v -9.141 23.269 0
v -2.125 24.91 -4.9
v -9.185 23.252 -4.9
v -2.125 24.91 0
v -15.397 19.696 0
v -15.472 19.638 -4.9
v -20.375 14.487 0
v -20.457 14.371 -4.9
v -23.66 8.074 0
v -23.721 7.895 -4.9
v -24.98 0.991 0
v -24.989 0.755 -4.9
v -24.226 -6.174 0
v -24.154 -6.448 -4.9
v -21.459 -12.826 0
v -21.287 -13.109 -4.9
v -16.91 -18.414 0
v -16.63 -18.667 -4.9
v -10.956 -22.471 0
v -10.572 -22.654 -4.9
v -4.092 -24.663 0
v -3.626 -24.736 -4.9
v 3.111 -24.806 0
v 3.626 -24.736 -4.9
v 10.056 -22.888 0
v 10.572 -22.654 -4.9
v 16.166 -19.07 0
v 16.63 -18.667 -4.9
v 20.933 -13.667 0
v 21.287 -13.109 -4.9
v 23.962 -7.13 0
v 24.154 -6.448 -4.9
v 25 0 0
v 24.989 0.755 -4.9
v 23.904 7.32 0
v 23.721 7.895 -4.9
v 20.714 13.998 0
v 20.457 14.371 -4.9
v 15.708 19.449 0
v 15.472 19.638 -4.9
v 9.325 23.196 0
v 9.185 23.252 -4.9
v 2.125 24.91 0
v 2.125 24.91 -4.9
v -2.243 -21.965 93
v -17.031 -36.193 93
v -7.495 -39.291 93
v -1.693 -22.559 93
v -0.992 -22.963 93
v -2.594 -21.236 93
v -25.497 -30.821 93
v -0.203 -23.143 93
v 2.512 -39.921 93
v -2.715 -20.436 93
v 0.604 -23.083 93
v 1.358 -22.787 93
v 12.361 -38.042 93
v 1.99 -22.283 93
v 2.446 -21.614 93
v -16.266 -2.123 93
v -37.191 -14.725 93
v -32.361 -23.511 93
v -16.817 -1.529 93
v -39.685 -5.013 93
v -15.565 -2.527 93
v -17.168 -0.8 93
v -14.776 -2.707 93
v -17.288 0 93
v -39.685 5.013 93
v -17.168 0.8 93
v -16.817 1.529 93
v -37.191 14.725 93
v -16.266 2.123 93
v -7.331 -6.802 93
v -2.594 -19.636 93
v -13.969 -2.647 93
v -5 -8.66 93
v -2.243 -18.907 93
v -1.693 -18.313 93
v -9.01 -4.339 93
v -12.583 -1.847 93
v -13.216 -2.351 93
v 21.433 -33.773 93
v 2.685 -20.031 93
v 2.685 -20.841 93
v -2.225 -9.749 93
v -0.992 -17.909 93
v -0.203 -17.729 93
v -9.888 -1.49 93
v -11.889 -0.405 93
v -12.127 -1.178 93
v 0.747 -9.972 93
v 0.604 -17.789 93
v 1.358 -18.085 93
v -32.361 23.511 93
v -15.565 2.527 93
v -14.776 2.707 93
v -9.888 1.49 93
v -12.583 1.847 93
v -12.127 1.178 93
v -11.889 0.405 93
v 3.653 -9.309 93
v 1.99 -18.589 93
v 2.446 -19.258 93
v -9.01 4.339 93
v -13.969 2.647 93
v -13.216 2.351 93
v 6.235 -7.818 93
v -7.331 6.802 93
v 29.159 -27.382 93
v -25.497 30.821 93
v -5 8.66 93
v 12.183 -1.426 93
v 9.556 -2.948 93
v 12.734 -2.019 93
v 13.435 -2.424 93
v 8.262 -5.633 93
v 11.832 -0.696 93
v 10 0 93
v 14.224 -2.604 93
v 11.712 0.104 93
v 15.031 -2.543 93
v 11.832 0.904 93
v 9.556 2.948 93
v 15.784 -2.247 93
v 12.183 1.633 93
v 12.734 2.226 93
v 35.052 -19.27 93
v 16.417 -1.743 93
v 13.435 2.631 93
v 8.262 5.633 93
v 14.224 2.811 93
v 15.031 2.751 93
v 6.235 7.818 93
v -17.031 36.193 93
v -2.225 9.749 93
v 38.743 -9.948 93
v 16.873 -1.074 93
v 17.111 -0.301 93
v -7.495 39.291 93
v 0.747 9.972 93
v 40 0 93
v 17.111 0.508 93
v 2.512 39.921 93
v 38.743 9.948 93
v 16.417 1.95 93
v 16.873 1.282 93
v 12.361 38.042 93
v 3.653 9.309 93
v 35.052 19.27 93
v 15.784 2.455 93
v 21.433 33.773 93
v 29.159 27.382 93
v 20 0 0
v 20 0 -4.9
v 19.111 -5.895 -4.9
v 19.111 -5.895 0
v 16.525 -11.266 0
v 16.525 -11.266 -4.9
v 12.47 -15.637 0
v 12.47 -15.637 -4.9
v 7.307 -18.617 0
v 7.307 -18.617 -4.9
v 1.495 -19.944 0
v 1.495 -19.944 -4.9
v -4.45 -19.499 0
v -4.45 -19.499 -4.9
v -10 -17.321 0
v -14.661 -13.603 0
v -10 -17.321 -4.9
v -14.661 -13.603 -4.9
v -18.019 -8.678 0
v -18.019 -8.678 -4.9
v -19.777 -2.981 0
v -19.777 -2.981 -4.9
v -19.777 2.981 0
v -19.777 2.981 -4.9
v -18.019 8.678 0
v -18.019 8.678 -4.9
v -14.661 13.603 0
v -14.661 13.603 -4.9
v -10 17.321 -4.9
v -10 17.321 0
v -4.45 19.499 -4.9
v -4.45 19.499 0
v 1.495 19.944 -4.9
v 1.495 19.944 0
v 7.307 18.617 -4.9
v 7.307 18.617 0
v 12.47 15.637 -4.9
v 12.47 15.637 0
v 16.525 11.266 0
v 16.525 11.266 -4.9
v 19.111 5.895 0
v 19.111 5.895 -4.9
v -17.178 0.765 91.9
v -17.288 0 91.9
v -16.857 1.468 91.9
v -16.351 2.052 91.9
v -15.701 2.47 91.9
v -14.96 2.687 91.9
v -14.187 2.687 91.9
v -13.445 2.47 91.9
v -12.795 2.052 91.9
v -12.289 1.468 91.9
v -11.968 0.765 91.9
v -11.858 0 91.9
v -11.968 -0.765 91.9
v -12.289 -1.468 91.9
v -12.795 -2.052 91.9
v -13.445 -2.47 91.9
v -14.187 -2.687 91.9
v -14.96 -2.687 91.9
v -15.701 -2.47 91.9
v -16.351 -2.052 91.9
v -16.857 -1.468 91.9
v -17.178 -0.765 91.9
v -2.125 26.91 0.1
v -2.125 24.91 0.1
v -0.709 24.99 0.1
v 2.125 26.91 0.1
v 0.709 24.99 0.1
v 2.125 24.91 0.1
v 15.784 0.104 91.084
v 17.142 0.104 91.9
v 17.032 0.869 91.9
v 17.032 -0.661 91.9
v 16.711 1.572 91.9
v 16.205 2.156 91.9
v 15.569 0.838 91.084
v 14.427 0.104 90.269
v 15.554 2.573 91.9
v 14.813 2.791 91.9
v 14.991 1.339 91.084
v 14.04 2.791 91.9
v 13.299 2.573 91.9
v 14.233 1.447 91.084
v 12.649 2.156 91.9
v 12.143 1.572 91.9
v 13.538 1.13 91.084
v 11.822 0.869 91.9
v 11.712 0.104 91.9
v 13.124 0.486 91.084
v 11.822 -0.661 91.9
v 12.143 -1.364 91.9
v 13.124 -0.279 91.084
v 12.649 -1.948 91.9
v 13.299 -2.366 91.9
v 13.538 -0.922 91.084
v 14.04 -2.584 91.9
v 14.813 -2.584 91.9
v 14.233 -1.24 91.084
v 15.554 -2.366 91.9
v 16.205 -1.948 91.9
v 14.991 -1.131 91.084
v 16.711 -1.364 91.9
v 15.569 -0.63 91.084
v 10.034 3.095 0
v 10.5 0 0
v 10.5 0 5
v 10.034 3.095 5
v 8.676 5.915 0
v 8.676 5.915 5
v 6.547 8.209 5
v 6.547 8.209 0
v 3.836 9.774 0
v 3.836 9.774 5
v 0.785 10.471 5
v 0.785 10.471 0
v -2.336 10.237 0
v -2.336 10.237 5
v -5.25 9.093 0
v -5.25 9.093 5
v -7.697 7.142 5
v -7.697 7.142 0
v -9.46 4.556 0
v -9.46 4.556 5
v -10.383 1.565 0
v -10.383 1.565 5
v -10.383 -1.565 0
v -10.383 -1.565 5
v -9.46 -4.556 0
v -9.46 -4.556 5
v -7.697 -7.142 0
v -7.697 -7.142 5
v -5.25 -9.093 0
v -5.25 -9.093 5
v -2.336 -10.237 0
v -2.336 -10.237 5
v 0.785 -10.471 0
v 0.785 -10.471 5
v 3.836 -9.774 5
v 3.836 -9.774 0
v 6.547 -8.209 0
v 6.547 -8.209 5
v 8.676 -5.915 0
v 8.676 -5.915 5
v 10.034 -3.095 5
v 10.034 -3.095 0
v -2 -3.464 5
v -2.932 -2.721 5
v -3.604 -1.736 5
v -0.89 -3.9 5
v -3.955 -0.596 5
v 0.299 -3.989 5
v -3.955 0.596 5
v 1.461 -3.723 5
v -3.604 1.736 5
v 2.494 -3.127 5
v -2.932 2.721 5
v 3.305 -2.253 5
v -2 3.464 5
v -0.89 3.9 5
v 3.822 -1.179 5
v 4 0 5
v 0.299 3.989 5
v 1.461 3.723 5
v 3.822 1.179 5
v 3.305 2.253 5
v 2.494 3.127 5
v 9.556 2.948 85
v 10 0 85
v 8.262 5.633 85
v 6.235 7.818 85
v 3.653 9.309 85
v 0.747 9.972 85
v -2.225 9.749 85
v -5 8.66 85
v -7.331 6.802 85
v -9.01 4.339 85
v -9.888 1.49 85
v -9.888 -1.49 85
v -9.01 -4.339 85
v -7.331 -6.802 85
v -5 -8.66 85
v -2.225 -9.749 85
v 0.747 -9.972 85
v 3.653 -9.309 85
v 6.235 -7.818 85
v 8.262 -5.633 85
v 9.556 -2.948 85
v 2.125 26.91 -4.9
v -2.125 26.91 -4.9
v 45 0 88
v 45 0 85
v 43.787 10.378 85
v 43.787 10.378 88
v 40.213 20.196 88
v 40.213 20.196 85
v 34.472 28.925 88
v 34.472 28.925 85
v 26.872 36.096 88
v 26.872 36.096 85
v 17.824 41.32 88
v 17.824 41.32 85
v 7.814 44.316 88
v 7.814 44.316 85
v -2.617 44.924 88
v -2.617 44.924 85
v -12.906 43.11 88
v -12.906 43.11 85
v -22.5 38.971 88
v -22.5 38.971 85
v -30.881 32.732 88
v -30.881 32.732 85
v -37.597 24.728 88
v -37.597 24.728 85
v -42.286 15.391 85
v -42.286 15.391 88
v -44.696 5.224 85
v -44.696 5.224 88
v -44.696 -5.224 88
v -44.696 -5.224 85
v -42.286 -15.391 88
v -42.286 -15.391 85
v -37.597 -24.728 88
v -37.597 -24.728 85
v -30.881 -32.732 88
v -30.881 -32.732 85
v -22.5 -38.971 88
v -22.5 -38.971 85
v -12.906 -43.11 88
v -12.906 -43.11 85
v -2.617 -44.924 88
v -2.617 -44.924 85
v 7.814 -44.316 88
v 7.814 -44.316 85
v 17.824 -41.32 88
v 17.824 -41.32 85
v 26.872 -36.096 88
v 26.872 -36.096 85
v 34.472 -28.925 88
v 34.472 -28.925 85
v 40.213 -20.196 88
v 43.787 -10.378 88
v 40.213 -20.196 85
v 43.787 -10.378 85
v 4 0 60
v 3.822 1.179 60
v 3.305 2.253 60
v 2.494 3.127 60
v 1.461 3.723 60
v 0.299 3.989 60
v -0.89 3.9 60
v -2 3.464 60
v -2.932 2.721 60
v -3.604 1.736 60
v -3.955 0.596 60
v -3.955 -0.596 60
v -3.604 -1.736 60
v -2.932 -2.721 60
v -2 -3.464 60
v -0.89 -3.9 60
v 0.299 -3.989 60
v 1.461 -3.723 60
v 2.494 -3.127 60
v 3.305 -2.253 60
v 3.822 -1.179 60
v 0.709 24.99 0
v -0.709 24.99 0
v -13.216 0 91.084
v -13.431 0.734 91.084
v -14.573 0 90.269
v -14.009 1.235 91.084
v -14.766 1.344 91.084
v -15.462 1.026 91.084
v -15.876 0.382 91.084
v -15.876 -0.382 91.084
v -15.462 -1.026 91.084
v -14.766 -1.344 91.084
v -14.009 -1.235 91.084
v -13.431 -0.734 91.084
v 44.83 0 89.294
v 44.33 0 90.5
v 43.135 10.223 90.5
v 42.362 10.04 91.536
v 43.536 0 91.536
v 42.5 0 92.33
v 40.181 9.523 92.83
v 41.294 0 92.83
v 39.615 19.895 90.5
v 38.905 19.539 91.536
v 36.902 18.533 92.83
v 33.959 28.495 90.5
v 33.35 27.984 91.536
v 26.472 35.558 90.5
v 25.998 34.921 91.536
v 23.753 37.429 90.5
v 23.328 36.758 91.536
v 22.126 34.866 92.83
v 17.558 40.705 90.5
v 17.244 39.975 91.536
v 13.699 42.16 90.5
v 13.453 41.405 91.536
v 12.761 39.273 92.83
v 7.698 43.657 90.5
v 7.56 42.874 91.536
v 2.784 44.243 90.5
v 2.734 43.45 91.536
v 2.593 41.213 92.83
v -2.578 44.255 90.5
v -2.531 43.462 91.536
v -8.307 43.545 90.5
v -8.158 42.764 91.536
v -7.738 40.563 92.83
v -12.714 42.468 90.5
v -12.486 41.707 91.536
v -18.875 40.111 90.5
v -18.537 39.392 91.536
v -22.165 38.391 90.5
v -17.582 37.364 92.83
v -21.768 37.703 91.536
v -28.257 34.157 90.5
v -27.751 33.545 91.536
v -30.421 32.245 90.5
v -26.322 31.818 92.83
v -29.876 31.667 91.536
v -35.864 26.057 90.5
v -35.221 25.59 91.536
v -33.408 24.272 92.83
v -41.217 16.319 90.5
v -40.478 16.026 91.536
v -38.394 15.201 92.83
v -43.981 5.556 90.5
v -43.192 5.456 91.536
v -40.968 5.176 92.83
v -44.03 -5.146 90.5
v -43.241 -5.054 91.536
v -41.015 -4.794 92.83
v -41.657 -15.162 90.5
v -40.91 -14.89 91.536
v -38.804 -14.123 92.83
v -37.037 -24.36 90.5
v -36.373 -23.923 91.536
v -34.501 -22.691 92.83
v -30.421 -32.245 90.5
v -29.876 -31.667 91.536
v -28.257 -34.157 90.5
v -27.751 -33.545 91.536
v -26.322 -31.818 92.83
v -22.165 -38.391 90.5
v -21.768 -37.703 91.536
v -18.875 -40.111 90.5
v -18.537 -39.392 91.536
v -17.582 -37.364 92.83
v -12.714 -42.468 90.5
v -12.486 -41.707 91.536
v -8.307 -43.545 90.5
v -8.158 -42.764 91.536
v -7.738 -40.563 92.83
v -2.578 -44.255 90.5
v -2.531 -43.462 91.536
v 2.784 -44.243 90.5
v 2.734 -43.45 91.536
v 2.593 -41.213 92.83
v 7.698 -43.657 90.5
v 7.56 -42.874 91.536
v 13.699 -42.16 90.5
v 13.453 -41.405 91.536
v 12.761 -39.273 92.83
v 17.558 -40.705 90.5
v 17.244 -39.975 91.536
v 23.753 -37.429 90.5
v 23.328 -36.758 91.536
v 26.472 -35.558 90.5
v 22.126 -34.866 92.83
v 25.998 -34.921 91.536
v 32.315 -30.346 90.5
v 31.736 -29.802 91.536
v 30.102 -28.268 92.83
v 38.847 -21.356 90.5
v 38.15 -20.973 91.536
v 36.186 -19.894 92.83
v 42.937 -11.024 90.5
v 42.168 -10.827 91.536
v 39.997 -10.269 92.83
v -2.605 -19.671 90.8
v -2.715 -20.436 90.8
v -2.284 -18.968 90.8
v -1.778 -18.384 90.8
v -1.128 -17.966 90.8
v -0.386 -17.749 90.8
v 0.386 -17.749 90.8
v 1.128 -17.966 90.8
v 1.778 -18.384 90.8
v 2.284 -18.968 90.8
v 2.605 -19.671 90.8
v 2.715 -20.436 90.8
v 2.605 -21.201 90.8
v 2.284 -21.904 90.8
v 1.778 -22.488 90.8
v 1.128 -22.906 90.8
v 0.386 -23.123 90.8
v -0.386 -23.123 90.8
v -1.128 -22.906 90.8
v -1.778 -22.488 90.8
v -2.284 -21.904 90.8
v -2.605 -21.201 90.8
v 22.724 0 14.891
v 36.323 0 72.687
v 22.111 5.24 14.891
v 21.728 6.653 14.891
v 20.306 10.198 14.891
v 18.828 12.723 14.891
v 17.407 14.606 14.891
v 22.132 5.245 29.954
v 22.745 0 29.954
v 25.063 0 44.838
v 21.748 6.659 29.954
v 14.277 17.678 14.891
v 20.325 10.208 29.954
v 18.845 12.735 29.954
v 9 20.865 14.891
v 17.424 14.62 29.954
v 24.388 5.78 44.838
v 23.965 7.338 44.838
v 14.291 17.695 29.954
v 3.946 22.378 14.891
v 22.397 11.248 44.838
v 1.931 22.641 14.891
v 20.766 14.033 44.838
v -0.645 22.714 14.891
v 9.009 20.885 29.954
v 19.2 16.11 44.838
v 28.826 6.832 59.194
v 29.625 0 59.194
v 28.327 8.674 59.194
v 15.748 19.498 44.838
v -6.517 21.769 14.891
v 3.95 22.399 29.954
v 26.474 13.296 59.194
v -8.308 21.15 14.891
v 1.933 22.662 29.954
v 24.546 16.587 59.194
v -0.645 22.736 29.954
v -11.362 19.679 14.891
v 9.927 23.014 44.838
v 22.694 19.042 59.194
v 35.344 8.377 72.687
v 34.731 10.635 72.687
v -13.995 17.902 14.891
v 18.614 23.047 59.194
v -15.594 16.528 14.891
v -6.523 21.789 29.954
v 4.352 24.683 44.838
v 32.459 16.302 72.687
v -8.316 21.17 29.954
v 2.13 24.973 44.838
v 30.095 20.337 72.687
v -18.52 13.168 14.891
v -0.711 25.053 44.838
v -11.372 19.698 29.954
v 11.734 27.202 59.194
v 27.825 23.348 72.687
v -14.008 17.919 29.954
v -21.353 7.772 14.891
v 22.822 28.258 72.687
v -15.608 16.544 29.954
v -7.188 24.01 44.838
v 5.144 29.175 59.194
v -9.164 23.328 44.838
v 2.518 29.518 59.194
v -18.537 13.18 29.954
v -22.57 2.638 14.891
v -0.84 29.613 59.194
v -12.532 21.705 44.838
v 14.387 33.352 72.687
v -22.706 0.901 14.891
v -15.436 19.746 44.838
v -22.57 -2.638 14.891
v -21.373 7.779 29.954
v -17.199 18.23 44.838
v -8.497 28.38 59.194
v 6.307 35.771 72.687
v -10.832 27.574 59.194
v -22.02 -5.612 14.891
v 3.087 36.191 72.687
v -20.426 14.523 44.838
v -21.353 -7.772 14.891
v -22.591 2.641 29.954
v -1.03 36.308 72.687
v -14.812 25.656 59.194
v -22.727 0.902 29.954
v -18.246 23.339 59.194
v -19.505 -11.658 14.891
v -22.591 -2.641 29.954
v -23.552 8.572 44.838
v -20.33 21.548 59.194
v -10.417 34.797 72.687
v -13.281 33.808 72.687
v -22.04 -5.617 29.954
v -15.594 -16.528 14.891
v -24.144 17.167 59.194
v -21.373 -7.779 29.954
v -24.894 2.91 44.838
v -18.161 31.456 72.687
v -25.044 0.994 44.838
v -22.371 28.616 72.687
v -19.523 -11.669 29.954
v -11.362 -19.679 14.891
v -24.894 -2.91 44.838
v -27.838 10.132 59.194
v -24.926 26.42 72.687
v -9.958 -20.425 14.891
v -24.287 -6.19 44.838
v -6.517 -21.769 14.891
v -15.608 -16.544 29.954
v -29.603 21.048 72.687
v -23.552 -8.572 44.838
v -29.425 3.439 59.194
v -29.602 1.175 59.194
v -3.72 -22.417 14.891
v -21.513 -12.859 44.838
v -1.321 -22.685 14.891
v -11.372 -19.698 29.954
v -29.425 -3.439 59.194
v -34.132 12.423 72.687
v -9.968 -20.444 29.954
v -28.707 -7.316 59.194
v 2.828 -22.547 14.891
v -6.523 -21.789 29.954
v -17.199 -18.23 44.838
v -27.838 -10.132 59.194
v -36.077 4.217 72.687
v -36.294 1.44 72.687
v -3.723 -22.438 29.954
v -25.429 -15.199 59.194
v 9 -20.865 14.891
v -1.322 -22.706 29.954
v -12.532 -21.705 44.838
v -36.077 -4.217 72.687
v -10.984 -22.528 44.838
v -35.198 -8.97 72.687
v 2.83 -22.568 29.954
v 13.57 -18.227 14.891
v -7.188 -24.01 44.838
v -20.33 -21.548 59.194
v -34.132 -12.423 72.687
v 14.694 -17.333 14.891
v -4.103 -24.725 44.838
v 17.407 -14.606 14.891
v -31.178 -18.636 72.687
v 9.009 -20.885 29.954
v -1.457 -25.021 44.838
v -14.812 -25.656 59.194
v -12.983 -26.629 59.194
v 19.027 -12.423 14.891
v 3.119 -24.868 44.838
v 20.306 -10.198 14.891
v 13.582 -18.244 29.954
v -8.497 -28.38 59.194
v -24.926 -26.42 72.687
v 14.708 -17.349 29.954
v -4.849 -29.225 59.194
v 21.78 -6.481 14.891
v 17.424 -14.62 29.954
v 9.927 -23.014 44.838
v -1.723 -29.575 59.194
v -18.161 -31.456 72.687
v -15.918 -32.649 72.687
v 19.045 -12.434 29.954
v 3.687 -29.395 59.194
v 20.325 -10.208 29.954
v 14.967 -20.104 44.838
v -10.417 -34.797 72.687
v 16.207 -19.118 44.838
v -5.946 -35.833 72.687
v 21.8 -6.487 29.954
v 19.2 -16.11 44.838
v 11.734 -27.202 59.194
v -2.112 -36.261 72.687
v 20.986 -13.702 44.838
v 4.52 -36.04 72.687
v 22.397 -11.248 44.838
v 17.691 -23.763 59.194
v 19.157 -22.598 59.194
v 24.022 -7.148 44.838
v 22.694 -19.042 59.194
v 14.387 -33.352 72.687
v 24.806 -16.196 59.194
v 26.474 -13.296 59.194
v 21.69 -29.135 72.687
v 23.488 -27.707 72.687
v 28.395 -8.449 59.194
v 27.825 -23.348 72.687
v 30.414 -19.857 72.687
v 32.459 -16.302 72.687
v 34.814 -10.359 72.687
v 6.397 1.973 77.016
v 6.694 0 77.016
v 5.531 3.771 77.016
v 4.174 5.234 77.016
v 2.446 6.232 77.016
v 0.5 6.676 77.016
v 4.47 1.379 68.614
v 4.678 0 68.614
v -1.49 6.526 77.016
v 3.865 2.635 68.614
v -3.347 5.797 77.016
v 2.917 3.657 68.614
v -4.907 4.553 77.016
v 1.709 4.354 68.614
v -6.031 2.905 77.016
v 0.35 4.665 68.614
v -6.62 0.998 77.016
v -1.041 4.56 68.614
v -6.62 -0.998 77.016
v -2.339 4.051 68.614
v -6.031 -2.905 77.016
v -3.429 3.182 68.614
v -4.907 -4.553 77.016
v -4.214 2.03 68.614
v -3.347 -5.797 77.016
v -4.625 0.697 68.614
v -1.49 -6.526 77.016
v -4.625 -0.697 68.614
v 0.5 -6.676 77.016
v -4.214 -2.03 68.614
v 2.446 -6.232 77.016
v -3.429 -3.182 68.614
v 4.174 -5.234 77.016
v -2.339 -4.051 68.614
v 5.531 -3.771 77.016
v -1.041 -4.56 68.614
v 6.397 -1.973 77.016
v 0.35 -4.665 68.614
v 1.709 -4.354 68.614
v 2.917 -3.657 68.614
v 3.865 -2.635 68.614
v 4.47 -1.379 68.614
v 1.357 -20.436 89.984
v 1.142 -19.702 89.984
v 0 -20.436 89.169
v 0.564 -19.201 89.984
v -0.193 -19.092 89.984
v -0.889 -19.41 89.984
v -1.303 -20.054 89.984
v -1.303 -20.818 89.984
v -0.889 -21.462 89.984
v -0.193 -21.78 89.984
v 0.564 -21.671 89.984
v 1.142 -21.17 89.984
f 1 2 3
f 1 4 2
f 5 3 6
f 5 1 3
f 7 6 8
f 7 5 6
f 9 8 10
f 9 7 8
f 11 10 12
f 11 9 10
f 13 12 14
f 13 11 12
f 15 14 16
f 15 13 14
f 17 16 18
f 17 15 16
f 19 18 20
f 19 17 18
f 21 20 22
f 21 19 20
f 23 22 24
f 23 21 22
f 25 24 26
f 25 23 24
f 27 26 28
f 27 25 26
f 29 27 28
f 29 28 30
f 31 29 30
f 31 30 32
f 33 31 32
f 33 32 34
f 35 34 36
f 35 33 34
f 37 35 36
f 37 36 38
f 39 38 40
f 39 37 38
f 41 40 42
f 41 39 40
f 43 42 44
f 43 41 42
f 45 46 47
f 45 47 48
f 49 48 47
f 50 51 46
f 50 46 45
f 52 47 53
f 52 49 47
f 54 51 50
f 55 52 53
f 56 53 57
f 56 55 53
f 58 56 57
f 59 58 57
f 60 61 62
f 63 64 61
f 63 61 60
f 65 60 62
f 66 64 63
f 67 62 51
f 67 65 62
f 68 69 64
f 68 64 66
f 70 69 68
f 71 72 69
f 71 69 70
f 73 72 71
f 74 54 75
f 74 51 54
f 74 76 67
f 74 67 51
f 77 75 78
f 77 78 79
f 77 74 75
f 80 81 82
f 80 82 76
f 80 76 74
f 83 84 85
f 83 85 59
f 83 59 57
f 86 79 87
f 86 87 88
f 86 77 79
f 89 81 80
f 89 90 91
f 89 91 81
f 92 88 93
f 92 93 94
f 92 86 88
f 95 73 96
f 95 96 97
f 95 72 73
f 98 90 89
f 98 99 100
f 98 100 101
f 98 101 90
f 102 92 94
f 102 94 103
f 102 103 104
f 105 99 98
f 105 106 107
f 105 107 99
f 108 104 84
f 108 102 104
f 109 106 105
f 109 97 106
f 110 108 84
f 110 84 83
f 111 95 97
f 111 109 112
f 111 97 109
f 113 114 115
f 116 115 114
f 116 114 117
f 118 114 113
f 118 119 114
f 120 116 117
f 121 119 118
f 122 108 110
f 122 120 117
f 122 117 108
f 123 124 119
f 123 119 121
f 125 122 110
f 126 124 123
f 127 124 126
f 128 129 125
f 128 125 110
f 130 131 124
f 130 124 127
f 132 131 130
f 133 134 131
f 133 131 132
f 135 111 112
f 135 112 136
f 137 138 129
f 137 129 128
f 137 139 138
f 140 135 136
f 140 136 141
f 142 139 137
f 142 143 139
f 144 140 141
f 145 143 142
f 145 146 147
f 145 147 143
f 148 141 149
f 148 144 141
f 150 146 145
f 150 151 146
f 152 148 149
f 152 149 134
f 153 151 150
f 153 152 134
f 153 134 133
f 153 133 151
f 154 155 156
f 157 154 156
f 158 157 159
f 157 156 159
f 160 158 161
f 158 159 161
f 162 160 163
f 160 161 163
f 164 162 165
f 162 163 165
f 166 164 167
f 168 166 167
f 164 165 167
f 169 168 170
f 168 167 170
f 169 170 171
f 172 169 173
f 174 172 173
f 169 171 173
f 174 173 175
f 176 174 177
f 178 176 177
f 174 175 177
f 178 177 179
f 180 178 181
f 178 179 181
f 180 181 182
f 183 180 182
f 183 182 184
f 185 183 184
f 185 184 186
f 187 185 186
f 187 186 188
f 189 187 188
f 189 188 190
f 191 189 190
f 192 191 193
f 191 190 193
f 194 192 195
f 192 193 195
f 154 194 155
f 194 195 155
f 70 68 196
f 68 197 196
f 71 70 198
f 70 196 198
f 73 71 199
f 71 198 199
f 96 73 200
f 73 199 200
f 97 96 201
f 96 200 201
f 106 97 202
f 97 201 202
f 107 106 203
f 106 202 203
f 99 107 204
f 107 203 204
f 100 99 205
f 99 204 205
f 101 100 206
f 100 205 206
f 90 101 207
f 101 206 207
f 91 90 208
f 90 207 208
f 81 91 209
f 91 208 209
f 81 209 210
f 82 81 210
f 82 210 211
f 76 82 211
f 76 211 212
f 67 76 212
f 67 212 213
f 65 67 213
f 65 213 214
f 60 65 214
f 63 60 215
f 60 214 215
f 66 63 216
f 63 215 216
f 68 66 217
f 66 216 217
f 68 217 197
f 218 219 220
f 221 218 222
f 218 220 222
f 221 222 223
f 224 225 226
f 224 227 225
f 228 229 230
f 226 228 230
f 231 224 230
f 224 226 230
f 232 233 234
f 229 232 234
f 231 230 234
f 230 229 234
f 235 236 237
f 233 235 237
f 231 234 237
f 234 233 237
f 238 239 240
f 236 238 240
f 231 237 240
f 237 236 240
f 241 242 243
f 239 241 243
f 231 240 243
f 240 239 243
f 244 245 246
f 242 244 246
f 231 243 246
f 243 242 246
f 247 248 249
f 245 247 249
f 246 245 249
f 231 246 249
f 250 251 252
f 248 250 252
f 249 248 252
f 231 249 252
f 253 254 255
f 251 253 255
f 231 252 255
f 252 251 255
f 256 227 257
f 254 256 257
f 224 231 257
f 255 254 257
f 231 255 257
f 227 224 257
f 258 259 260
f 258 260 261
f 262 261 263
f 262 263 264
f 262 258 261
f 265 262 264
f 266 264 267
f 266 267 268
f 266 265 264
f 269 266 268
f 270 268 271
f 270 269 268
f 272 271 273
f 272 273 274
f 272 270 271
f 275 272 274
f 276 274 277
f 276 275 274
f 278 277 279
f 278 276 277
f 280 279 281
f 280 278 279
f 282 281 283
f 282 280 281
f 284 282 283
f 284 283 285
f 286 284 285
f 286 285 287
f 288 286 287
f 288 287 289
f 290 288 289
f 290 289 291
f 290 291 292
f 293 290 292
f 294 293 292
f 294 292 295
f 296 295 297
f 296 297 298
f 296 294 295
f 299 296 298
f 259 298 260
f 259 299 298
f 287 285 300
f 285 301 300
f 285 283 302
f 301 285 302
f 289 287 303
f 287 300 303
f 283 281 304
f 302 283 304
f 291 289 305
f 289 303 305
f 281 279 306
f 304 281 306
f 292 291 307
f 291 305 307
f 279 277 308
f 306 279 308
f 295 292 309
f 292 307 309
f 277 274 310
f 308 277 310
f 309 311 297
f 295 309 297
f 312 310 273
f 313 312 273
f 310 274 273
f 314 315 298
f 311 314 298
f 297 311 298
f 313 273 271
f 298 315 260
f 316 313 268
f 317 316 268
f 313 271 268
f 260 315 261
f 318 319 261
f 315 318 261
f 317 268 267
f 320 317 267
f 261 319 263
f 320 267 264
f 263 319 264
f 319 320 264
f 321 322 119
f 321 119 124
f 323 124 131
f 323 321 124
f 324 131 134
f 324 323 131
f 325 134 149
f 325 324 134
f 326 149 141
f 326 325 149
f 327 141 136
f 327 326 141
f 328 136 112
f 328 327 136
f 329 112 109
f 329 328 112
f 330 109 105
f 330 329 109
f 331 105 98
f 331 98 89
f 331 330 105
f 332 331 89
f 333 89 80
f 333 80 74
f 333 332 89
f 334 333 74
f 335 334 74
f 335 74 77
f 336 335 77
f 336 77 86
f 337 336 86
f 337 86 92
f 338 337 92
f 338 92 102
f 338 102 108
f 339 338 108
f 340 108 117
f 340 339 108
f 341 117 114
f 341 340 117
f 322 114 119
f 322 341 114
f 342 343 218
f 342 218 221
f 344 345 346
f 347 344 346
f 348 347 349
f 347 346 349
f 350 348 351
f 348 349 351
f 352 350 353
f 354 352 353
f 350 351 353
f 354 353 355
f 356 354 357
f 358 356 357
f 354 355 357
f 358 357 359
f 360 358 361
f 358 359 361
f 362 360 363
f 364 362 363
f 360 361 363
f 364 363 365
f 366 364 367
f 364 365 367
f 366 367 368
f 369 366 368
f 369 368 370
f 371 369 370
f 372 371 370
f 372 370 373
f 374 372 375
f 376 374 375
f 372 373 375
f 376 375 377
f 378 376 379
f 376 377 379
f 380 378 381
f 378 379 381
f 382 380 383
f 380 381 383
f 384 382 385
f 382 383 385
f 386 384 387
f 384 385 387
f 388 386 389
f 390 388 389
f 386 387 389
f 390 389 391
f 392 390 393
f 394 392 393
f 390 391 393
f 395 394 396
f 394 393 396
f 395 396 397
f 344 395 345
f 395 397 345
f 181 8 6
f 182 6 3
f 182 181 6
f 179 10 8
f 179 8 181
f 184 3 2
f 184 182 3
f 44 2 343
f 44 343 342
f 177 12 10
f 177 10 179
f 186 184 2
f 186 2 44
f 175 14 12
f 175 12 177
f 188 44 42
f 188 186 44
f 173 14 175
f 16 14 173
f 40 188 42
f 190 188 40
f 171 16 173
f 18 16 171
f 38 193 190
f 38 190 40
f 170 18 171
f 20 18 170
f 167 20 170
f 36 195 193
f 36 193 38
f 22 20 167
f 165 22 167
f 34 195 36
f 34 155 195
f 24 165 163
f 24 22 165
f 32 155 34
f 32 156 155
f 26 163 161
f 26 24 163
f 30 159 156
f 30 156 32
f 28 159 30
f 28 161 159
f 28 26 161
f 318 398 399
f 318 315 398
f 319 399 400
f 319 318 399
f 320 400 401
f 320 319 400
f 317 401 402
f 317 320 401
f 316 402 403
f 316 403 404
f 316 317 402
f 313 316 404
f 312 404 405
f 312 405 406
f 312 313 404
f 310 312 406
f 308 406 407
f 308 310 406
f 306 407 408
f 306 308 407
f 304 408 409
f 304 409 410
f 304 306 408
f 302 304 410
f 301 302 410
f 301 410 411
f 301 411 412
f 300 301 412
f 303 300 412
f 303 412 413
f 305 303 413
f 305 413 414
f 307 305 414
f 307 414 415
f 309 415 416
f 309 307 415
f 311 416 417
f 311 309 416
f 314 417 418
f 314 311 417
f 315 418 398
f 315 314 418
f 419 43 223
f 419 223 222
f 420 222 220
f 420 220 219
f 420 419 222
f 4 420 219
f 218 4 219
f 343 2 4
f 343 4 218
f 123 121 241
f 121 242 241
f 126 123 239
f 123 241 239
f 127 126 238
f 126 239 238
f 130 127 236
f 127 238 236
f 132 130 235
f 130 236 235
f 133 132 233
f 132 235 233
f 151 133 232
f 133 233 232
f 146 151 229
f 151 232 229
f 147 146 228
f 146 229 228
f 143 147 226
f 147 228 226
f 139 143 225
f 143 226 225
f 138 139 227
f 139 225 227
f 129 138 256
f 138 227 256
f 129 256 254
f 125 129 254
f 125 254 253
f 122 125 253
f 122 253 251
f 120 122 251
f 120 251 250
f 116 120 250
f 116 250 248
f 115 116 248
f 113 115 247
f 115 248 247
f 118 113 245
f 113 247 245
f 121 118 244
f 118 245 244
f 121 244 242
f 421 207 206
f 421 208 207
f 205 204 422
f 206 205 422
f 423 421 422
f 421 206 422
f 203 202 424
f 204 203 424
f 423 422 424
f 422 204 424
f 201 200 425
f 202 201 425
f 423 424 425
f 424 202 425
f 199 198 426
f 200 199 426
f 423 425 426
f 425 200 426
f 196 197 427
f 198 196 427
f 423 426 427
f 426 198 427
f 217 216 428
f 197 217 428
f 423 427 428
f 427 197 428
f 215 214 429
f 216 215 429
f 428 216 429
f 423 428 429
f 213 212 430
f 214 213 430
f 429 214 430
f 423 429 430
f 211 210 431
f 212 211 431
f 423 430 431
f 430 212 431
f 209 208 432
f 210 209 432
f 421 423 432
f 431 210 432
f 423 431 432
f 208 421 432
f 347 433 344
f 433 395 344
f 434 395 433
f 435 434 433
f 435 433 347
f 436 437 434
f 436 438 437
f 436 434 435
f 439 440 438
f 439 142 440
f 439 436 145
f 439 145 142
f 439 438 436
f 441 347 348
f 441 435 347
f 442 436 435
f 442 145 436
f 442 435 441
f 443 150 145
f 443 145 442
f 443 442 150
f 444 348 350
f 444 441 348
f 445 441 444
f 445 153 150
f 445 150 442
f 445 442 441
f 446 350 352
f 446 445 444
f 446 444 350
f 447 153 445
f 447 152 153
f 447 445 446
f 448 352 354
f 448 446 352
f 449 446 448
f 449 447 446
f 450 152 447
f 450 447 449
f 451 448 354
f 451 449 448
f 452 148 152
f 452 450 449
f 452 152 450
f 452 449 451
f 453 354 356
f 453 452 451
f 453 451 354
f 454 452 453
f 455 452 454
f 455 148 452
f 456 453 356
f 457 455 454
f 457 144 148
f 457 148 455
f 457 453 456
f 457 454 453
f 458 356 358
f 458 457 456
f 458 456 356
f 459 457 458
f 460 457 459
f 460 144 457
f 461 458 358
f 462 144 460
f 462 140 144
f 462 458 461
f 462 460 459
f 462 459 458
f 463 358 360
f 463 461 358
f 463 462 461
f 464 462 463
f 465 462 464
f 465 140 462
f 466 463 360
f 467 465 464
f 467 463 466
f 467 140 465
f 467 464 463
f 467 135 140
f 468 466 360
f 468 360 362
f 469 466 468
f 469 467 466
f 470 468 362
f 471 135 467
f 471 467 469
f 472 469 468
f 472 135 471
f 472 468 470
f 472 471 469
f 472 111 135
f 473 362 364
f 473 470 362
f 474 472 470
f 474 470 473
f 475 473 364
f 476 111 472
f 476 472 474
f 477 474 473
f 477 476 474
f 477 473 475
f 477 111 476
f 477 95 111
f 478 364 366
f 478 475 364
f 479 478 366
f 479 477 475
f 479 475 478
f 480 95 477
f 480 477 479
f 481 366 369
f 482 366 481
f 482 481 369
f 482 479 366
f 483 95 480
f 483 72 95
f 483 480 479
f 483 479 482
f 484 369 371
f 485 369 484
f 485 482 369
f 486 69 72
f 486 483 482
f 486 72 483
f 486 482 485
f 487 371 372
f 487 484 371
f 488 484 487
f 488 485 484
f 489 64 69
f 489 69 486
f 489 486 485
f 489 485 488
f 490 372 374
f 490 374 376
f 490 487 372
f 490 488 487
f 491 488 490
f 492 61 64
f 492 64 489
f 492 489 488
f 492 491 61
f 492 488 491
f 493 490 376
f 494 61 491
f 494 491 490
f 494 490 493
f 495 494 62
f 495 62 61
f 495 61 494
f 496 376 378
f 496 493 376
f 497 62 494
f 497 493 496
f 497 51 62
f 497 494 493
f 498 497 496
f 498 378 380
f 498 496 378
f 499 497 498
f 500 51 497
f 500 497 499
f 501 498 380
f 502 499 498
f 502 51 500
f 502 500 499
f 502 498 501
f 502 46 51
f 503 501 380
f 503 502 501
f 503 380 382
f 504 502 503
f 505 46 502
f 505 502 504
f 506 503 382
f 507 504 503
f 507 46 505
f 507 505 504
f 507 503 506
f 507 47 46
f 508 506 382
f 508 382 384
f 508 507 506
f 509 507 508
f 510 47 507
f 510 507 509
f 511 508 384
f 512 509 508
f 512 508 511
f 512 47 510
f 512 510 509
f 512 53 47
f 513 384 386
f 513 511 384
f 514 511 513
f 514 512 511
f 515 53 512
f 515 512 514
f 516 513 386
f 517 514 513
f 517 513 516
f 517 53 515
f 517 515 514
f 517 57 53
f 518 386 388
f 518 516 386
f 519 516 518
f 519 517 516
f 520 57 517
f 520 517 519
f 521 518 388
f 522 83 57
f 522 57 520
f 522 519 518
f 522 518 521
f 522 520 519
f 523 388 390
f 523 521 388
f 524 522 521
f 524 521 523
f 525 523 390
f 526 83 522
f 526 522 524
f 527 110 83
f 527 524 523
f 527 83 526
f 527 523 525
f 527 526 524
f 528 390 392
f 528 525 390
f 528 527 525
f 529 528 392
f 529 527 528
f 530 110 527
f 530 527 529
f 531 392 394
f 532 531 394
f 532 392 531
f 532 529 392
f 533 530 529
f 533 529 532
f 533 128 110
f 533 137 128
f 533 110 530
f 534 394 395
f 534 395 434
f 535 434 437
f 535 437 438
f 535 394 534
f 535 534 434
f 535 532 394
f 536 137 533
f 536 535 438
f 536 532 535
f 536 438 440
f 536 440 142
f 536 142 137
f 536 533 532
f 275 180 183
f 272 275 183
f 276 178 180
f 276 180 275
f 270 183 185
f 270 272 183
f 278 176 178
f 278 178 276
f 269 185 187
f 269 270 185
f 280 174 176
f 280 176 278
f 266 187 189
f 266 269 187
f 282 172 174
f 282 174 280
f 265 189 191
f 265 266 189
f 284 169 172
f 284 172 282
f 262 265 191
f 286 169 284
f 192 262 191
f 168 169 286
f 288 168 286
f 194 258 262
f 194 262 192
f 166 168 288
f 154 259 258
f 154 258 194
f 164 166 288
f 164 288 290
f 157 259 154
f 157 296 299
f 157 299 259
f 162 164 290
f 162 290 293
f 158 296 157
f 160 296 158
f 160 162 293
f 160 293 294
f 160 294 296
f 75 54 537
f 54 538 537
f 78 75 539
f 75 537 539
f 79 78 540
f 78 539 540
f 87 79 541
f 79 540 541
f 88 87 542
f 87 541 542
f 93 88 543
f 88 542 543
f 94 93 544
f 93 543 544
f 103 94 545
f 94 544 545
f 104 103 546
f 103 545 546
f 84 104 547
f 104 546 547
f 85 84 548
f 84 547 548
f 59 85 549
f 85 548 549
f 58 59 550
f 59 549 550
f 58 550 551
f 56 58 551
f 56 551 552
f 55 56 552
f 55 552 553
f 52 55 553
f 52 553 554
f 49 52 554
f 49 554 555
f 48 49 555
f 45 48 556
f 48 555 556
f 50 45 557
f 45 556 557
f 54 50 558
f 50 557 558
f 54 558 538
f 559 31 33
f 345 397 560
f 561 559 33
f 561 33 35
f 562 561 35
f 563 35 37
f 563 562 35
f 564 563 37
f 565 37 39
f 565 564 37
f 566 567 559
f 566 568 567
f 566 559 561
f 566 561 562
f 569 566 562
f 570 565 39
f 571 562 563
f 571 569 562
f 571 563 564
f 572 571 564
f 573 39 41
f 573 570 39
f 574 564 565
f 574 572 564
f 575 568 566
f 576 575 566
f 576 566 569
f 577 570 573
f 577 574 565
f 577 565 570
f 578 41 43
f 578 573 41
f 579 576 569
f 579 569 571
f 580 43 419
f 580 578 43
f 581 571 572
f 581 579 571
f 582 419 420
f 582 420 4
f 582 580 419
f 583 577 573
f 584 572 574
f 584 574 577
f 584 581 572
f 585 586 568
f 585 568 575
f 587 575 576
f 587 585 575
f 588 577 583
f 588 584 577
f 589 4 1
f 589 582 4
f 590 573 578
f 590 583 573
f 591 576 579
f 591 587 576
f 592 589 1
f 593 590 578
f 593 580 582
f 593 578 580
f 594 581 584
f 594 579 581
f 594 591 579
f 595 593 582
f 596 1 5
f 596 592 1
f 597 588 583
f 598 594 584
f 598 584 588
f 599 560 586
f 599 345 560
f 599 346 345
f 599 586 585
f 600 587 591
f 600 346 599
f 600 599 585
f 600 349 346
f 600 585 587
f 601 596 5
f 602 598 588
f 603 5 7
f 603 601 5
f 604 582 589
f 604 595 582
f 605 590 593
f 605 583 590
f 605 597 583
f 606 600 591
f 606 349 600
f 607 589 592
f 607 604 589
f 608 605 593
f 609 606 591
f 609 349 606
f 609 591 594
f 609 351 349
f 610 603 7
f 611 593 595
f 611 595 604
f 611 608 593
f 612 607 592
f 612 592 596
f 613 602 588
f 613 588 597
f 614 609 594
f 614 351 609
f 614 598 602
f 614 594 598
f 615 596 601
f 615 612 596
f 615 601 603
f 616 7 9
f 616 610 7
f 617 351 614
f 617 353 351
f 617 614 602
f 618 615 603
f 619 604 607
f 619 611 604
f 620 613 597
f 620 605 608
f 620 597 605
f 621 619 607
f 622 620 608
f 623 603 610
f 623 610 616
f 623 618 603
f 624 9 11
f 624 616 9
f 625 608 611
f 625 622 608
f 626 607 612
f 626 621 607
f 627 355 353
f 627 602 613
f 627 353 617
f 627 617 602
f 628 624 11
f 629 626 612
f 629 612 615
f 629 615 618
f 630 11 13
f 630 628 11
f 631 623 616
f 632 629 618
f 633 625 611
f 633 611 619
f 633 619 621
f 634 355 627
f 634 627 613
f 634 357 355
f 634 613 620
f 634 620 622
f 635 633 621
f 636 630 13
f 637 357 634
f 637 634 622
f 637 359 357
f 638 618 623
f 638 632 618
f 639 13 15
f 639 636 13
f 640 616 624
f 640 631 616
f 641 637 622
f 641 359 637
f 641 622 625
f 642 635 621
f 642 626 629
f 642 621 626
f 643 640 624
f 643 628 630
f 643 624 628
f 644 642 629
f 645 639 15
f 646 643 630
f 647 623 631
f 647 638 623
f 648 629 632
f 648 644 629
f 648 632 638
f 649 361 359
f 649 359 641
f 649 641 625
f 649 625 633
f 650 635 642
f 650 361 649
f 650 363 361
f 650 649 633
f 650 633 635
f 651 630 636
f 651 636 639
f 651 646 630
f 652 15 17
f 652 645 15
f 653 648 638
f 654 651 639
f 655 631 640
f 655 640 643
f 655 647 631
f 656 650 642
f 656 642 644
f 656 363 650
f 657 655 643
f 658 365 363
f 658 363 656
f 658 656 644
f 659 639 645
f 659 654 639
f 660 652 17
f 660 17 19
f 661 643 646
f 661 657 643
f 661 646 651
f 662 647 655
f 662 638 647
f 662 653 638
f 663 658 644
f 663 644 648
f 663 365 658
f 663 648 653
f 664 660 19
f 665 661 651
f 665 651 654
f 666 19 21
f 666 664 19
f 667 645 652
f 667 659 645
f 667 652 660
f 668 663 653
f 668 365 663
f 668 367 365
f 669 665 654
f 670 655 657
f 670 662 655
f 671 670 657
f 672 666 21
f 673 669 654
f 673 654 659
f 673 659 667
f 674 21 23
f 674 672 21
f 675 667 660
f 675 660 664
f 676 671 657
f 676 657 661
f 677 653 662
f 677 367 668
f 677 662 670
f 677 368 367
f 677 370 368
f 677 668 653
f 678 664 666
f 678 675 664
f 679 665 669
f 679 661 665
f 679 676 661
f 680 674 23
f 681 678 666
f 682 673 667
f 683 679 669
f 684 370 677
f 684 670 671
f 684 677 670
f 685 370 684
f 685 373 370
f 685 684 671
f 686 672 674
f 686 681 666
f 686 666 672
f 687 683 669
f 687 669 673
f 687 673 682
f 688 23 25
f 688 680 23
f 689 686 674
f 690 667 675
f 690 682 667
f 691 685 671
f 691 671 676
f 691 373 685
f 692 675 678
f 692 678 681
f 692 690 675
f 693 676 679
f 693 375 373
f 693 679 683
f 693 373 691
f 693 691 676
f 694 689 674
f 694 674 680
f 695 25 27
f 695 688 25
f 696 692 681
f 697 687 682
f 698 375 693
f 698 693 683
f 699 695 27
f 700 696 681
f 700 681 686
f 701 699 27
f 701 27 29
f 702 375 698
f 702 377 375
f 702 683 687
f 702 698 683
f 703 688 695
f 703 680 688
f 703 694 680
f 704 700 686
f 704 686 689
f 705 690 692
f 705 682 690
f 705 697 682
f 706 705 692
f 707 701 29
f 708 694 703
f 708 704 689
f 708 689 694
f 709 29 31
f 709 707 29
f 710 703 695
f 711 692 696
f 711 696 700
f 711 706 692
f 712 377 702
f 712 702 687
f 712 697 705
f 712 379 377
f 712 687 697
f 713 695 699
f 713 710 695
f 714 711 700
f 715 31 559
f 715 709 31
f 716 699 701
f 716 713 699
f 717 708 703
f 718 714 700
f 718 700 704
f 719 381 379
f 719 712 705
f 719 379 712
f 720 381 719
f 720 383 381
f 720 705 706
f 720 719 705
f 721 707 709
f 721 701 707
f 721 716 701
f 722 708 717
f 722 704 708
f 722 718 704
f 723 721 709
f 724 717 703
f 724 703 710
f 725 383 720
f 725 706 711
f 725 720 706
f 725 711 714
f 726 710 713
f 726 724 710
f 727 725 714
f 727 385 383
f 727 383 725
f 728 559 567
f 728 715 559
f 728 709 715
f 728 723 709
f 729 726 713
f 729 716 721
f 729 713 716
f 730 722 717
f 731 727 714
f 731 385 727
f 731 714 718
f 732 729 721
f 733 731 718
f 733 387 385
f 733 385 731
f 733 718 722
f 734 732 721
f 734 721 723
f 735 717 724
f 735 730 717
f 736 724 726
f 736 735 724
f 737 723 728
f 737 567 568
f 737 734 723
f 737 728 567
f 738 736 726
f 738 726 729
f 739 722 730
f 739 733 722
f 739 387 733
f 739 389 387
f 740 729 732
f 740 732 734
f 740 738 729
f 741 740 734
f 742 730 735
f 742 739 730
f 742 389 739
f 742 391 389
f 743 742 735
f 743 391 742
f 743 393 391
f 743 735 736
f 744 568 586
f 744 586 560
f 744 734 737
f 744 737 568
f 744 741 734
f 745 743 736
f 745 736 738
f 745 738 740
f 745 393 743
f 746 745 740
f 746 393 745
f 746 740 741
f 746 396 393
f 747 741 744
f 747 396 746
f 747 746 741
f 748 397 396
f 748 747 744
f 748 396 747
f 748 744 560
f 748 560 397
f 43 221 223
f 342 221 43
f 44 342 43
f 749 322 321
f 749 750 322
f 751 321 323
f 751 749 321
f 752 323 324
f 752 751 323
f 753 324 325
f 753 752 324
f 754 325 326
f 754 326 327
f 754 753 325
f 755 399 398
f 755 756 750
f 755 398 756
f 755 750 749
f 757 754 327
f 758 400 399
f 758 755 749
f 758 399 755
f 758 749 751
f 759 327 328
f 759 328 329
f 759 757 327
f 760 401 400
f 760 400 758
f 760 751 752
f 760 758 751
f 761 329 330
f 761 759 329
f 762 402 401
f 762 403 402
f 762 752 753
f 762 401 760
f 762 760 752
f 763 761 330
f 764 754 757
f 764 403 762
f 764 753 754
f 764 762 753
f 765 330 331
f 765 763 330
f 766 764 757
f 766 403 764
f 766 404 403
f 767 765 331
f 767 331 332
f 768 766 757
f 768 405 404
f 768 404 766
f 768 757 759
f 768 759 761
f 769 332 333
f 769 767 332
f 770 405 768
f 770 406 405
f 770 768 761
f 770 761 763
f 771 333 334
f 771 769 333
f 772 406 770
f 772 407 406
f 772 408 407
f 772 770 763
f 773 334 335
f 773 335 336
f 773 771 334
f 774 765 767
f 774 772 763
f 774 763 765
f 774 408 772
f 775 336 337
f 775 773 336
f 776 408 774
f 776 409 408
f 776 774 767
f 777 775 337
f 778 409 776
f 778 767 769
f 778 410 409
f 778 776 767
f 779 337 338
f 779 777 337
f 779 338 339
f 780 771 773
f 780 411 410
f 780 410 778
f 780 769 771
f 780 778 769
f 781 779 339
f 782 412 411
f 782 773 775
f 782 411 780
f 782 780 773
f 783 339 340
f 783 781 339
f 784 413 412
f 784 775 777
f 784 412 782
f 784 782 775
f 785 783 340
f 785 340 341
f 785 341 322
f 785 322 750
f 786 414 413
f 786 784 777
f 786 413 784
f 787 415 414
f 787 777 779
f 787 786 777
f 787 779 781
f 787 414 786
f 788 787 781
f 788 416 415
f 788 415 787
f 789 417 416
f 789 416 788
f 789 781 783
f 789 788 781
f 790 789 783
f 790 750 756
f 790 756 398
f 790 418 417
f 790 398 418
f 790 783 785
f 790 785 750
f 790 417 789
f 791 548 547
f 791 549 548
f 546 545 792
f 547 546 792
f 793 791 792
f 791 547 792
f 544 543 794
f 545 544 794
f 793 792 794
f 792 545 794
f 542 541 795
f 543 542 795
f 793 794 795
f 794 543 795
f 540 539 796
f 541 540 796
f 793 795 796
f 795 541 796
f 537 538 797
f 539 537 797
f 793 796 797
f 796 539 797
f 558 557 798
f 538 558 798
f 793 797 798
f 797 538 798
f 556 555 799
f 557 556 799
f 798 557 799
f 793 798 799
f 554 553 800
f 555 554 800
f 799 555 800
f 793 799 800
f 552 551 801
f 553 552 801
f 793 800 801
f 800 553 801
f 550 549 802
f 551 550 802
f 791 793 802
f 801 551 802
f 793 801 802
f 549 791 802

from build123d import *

# Parameters (mm, degrees)
F3_DEPTH  = 4.9
F4_R      = 20
F4_R_2    = 4
F5_DEPTH  = 4.9
F6_DEPTH  = 8
F7_R      = 5
F9_D      = 5.43
F9_DEPTH  = 1.1
F9_TIP    = 1.6313365807
F10_D     = 5.43
F10_DEPTH = 2.2
F10_TIP   = 1.6313365807
F11_R     = 10.5
F12_DEPTH = 5
F14_DEPTH = 5


with BuildPart() as f2:
    # F0 (on Front) → F2 (revolve)
    with BuildSketch(Plane.XZ):
        with BuildLine():
            Line((4, 0), (25, 0))
            ThreePointArc((25, 0), (25.0633115181, 44.8380443487), (45, 85))
            Line((45, 85), (10, 85))
            ThreePointArc((10, 85), (5.5209994492, 72.8549601322), (4, 60))
            Line((4, 60), (4, 0))
        make_face()
    revolve(axis=Axis((0, 0, 25.1682717353), (0, 0, 1)))

    # F3 (add): a face of the model
    f3_faces = [f2.faces().sort_by_distance(p)[0] for p in [
        (-4.7071067812, 0, 0),
    ]]
    extrude(f3_faces, amount=F3_DEPTH)

    # F4 (on face) → F5 (cut)
    with BuildSketch(Plane(origin=(0, 0, -4.9), x_dir=(1, 0, 0), z_dir=(0, 0, -1))):
        Circle(F4_R)
        Circle(F4_R_2, mode=Mode.SUBTRACT)
    extrude(amount=-F5_DEPTH, mode=Mode.SUBTRACT)

    # F6 (add): a face of the model
    f6_faces = [f2.faces().sort_by_distance(p)[0] for p in [
        (-43.7272077939, 0, 85),
    ]]
    extrude(f6_faces, amount=F6_DEPTH)

    # F7
    f7_edges = [f2.edges().sort_by_distance(p)[0] for p in [
        (-45, 0, 93),
    ]]
    fillet(f7_edges, radius=F7_R)

    # F9
    with Locations(Plane.XY.offset(93)):
        with Locations((14.426644952, 0.1037907432), (-14.573297048, 0)):
            Hole(F9_D / 2, depth=F9_DEPTH)
            with Locations((0, 0, -(F9_DEPTH + F9_TIP / 2))):  # 118° drill point
                Cone(0, F9_D / 2, F9_TIP, mode=Mode.SUBTRACT)

    # F10
    with Locations(Plane.XY.offset(93)):
        with Locations((0, -20.4359735063)):
            Hole(F10_D / 2, depth=F10_DEPTH)
            with Locations((0, 0, -(F10_DEPTH + F10_TIP / 2))):  # 118° drill point
                Cone(0, F10_D / 2, F10_TIP, mode=Mode.SUBTRACT)

    # F11 (on Top) → F12 (cut)
    with BuildSketch(Plane.XY):
        Circle(F11_R)
    extrude(amount=F12_DEPTH, mode=Mode.SUBTRACT)

    # F13 (on face) → F14 (join)
    with BuildSketch(Plane(origin=(0, 0, -4.9), x_dir=(1, 0, 0), z_dir=(0, 0, -1))):
        with BuildLine():
            ThreePointArc((2.125, -24.9095237811), (0, -25), (-2.125, -24.9095237811))
            Line((-2.125, -24.9095237811), (-2.125, -26.9095237811))
            Line((-2.125, -26.9095237811), (2.125, -26.9095237811))
            Line((2.125, -26.9095237811), (2.125, -24.9095237811))
        make_face()
    extrude(amount=-F14_DEPTH)


solid = f2.part
